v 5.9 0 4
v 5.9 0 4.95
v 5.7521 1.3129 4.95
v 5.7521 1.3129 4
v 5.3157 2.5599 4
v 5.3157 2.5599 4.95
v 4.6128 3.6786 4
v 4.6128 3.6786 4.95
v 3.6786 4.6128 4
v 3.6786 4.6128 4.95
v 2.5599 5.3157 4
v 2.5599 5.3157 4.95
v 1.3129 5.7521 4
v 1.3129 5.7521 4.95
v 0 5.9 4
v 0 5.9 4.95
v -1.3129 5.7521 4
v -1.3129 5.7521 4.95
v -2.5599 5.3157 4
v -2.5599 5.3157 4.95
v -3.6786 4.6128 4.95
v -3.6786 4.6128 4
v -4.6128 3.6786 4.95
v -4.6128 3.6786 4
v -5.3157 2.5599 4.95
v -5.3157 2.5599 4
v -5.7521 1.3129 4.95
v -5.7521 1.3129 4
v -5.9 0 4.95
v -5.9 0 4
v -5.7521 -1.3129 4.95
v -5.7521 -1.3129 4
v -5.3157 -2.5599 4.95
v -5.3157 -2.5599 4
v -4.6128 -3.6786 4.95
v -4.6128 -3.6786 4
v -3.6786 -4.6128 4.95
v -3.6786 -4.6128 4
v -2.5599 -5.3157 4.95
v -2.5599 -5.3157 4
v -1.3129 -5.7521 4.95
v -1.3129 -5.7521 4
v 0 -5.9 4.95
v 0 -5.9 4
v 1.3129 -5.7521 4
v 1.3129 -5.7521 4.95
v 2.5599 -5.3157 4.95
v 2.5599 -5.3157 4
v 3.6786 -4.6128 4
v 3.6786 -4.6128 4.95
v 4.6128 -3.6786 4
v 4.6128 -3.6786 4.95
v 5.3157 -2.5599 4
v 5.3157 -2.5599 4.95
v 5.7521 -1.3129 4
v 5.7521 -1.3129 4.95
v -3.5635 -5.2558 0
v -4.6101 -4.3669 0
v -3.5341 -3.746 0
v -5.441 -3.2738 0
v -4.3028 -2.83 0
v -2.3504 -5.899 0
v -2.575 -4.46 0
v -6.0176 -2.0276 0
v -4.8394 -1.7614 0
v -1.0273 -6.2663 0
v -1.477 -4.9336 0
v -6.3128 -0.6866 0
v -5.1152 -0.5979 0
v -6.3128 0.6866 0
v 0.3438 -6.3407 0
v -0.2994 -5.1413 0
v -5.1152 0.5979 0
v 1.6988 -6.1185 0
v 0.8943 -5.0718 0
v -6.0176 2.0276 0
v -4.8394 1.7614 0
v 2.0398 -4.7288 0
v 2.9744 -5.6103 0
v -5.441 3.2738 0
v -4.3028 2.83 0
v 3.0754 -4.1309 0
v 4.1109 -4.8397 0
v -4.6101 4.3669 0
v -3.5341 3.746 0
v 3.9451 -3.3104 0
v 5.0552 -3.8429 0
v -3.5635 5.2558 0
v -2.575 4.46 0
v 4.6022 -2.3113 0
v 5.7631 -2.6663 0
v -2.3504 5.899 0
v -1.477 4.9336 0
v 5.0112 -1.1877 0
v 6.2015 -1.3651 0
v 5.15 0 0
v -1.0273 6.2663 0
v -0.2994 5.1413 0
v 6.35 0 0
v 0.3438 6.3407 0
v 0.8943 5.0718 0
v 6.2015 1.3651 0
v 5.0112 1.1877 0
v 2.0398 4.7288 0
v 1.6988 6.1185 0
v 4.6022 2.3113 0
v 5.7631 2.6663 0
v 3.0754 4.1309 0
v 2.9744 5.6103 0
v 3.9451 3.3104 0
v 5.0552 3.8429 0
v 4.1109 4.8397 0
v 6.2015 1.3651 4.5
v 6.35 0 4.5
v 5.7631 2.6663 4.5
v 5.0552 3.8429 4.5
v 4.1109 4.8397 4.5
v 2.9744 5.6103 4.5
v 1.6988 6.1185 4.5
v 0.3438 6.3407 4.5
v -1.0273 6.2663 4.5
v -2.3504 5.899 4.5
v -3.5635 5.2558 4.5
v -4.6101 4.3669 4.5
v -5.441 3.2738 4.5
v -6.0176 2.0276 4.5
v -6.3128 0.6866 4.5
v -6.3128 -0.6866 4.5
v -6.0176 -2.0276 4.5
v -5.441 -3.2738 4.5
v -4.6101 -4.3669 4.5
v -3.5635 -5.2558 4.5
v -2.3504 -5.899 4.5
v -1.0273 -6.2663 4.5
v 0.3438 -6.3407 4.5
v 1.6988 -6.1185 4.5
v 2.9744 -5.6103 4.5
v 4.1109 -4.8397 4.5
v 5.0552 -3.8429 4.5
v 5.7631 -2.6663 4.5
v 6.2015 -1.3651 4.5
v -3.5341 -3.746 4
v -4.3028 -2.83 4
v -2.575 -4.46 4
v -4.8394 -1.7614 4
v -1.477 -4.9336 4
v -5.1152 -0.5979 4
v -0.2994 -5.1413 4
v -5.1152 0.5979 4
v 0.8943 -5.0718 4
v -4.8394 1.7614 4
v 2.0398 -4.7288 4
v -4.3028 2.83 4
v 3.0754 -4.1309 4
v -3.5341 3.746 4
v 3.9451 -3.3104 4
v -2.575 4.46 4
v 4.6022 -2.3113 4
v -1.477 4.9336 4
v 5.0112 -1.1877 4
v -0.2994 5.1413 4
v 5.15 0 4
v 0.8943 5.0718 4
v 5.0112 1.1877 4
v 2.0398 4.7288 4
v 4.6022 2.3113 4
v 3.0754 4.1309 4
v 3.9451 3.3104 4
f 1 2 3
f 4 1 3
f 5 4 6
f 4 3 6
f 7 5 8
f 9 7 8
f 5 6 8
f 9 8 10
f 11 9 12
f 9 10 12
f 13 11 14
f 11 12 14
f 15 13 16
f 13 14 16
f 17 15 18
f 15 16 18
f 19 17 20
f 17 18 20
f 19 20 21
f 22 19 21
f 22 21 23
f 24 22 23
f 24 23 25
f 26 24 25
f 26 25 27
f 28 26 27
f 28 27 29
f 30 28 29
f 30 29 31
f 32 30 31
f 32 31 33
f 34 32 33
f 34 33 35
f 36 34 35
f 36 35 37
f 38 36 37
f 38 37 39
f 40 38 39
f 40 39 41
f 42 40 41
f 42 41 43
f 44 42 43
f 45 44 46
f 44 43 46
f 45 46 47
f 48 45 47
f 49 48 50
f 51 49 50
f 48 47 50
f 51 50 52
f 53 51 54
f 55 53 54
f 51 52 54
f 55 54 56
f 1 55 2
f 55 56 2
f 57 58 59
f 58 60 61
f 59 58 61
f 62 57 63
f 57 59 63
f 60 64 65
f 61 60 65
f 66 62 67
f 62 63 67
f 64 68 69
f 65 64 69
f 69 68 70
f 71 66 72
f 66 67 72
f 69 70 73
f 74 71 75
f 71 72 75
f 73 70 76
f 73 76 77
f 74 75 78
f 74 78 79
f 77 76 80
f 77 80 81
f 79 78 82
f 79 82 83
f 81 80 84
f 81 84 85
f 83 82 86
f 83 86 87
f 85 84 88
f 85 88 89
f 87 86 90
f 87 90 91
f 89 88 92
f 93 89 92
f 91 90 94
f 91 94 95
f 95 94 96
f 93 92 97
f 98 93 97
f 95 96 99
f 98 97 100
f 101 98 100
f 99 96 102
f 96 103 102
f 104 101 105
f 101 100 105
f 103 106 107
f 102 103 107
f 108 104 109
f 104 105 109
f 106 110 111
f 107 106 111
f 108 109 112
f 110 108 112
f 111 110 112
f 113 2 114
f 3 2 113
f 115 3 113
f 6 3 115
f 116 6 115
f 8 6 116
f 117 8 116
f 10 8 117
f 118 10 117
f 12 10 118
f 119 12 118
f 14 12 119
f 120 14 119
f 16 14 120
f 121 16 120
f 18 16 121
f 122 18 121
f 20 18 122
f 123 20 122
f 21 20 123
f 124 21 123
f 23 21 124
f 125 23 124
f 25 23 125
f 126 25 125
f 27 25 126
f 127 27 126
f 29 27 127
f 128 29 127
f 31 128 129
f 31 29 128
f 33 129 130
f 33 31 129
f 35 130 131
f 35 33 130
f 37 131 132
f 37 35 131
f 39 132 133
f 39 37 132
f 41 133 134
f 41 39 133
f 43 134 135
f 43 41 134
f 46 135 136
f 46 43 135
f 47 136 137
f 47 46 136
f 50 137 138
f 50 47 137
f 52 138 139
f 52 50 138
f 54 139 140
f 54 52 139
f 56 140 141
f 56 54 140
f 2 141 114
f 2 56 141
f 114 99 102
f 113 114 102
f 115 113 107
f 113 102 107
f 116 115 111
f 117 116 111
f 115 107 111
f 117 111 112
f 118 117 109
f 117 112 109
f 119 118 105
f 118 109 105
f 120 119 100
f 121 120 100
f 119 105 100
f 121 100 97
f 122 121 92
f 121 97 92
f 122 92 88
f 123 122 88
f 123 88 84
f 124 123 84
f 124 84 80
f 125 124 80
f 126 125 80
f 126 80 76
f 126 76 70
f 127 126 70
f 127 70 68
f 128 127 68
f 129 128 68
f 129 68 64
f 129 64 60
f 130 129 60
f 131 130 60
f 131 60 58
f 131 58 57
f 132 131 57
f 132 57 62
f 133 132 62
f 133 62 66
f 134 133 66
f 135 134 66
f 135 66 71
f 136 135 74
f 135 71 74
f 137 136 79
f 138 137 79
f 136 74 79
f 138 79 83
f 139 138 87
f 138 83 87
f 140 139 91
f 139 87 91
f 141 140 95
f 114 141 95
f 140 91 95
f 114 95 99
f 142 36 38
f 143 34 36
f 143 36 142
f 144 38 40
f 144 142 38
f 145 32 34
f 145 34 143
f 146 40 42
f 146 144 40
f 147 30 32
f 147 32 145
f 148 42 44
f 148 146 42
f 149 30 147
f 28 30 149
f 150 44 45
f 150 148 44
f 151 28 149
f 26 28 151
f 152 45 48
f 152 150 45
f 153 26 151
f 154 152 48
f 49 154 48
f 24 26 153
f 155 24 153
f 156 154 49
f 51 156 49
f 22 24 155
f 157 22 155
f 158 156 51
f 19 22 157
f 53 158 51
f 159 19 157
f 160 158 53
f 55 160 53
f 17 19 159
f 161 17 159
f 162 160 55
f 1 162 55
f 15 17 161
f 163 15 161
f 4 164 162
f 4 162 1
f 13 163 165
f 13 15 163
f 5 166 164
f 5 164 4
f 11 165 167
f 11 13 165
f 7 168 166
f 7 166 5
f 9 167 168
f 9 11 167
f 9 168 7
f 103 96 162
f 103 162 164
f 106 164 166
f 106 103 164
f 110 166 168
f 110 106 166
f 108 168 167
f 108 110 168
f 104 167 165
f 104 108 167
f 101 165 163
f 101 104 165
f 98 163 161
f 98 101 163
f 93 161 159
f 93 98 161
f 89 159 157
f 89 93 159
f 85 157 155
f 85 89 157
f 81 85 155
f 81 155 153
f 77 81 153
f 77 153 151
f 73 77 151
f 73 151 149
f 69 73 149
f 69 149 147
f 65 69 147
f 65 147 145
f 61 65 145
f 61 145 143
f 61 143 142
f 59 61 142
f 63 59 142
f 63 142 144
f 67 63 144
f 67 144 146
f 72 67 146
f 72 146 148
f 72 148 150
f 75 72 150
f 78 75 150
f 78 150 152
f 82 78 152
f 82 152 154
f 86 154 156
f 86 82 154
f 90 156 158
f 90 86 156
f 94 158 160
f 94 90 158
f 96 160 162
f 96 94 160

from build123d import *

# Parameters (mm, degrees)
F0_R     = 6.35
F0_R_2   = 5.15
F1_DEPTH = 5
F2_R     = 5.9
F2_R_2   = 5.15
F3_DEPTH = 1


# Not quite as in the source:
# - a fillet or chamfer that OpenCascade refuses, or shapes differently, is made with other operations: its cross-section is extruded or revolved along the edge and cut away or added


with BuildPart() as f1:
    # F0 (on Top) → F1 (new body)
    with BuildSketch(Plane.XY):
        Circle(F0_R)
        Circle(F0_R_2, mode=Mode.SUBTRACT)
    extrude(amount=F1_DEPTH)

    # F2 (on face) → F3 (cut)
    with BuildSketch(Plane.XY.offset(5)):
        Circle(F2_R)
        Circle(F2_R_2, mode=Mode.SUBTRACT)
    extrude(amount=-F3_DEPTH, mode=Mode.SUBTRACT)

    # F4: chamfer of 0.5 on 1 edges, made by hand

    # F4_s1 → F4_t2 (revolve, cut)
    with BuildSketch(Plane.XZ):
        Polygon((6.35, 4.5), (5.85, 5), (6.35, 5), align=None)
    revolve(axis=Axis((0, 0, 5), (0, 0, 1)), mode=Mode.SUBTRACT)


solid = f1.part
